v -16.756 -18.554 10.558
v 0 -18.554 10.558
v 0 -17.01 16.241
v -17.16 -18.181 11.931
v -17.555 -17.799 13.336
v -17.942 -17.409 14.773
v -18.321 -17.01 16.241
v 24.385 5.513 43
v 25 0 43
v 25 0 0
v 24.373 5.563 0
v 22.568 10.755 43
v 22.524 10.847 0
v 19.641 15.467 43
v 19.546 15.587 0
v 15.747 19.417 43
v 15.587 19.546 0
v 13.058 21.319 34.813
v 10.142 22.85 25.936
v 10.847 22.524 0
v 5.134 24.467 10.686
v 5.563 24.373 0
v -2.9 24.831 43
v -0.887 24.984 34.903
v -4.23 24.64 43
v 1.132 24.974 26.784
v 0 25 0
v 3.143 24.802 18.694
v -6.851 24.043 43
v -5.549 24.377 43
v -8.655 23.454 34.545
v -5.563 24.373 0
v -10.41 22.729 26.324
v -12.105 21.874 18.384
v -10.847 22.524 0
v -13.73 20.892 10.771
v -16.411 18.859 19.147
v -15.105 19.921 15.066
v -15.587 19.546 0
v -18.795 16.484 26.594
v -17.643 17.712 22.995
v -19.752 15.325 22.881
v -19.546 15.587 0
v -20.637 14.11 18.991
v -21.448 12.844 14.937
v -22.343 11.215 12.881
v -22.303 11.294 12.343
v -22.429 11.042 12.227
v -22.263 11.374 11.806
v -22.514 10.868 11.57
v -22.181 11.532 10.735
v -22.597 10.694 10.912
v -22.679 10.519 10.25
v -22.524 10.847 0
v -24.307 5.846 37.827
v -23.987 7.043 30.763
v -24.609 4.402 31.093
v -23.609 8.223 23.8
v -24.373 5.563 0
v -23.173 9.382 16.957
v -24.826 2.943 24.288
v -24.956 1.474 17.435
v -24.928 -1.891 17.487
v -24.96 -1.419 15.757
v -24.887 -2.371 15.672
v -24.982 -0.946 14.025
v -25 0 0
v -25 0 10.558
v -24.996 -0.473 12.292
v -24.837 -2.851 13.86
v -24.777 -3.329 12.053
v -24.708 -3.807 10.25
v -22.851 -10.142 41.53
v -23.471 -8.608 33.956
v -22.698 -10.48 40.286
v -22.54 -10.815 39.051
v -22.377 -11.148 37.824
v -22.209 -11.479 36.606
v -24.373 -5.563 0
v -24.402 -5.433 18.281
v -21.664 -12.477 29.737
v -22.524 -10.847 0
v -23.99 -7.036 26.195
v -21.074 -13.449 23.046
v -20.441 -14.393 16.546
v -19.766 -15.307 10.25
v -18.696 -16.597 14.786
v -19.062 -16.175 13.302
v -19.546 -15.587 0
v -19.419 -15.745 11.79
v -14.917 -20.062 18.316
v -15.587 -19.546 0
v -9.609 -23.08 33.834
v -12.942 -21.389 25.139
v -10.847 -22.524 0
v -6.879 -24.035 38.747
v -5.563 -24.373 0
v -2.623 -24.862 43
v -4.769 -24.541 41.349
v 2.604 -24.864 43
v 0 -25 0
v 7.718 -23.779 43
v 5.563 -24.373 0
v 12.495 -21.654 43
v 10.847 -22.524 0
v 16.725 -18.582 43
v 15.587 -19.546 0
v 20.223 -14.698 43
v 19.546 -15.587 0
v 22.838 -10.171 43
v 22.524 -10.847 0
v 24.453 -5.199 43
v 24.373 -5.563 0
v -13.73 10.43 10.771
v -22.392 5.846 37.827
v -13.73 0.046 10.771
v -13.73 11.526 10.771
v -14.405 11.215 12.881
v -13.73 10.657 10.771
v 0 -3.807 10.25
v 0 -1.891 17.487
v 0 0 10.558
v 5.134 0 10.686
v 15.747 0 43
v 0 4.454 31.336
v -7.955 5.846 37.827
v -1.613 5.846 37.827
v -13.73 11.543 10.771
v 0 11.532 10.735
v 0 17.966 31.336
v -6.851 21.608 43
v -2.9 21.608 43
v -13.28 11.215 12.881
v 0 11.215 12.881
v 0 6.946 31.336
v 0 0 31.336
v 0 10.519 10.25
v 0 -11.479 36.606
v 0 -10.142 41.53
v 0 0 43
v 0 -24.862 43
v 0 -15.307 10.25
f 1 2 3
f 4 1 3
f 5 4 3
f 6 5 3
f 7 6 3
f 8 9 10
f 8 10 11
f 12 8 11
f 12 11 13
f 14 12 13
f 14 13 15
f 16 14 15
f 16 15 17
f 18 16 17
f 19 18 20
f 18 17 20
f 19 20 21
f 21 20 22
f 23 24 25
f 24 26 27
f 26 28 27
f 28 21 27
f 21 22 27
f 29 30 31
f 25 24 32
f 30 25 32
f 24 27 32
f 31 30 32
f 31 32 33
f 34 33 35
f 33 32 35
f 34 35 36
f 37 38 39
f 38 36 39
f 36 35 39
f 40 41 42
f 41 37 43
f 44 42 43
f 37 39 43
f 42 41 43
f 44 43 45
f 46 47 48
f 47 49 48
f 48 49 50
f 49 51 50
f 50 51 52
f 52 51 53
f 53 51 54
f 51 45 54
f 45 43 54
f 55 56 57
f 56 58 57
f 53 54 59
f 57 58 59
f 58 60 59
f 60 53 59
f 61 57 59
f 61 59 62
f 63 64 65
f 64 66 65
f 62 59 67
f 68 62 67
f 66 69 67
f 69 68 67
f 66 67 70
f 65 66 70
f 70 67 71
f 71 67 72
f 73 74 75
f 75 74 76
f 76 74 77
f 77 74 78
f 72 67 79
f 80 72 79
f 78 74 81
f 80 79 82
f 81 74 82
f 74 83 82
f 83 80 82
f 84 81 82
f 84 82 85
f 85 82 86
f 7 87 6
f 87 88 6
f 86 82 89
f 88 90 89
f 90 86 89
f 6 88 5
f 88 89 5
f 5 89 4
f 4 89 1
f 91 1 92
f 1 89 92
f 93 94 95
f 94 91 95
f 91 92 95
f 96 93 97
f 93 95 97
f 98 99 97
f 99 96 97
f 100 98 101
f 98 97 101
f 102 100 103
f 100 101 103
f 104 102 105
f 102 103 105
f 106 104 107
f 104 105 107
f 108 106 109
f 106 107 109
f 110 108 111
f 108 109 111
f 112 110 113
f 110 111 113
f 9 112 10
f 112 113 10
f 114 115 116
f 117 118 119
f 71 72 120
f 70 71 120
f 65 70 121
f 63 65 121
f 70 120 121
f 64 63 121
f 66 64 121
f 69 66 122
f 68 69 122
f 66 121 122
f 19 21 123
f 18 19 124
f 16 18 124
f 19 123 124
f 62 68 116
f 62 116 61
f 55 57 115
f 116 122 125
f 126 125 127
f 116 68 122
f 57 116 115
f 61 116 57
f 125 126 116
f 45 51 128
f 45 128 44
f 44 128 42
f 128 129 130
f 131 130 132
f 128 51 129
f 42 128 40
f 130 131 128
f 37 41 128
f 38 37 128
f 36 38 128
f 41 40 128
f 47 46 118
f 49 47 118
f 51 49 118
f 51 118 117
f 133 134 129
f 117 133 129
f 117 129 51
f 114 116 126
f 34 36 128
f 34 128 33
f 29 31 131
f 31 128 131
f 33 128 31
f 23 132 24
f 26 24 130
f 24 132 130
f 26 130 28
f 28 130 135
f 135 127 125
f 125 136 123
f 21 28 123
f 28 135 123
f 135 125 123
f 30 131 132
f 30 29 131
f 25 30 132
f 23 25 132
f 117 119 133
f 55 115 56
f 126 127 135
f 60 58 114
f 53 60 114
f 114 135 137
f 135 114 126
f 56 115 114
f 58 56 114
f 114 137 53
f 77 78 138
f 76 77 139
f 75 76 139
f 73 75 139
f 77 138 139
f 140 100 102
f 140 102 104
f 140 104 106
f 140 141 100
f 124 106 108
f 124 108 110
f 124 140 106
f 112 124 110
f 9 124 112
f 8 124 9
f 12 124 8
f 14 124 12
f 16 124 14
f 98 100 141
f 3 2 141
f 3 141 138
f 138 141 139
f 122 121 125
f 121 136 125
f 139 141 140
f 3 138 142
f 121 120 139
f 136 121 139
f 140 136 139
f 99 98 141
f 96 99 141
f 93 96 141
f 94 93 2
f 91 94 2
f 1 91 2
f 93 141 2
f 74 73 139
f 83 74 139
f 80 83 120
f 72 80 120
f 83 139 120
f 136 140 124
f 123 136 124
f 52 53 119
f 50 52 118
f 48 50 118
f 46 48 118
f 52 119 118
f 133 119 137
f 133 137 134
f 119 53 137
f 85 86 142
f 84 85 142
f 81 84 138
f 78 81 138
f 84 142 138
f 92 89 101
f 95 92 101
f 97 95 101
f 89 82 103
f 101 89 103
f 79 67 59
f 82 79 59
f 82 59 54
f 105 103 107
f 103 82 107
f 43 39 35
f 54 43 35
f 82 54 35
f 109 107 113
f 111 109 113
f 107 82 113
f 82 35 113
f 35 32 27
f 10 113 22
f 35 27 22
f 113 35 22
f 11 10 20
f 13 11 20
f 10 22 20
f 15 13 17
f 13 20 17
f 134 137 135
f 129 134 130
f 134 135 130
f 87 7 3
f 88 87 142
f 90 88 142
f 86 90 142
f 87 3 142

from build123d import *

# Parameters (mm, degrees)
F0_R      = 25
F1_DEPTH  = 43
F3_DEPTH  = 25.001
F5_DEPTH  = 25.001
F7_DEPTH  = 25.001
F9_DEPTH  = 25.001
F11_DEPTH = 25.001


with BuildPart() as f1:
    # F0 (on Top) → F1 (new body)
    with BuildSketch(Plane.XY):
        Circle(F0_R)
    extrude(amount=F1_DEPTH)

    # F2 (on Front) → F3 (cut, through all)
    with BuildSketch(Plane.XZ):
        Polygon((-25.126258, 46.368178), (-13.729673, 10.771434), (-6.131949, 46.368178), align=None)
    extrude(amount=-F3_DEPTH, mode=Mode.SUBTRACT)

    # F4 (on Right) → F5 (cut, through all)
    with BuildSketch(Plane.YZ):
        Polygon((-18.553859, 10.558189), (-9.720897, 43.07955), (-24.877457, 43.07955), align=None)
        Polygon((-8.875068, 43.07955), (0, 10.558189), (6.971865, 43.07955), align=None)
    extrude(amount=-F5_DEPTH, mode=Mode.SUBTRACT)

    # F6 (on Front) → F7 (cut, through all)
    with BuildSketch(Plane.XZ):
        Polygon((15.750895, 43.012153), (-2.902546, 43.012153), (5.133678, 10.685987), align=None)
    extrude(amount=-F7_DEPTH, mode=Mode.SUBTRACT)

    # F8 (on Right) → F9 (cut, through all)
    with BuildSketch(Plane.YZ):
        Polygon((-15.306979, 10.250338), (-10.540752, 43.066985), (-24.638727, 43.066985), align=None)
        Polygon((-10.504041, 43.066985), (-10.452851, 43.066985), (-10.504041, 43.319747), (-10.540752, 43.066985), align=None)
        Polygon((-3.806771, 10.250338), (4.882272, 43.066985), (-10.452851, 43.066985), align=None)
        Polygon((4.928349, 43.066985), (4.957838, 43.066985), (4.928349, 43.241009), (4.882272, 43.066985), align=None)
        Polygon((10.518654, 10.250338), (19.207697, 43.066985), (4.957838, 43.066985), align=None)
    extrude(amount=-F9_DEPTH, mode=Mode.SUBTRACT)

    # F10 (on Right) → F11 (cut, through all)
    with BuildSketch(Plane.YZ):
        Polygon((11.531889, 10.734837), (21.7263, 43.37864), (6.711997, 43.37864), align=None)
    extrude(amount=-F11_DEPTH, mode=Mode.SUBTRACT)


solid = f1.part
